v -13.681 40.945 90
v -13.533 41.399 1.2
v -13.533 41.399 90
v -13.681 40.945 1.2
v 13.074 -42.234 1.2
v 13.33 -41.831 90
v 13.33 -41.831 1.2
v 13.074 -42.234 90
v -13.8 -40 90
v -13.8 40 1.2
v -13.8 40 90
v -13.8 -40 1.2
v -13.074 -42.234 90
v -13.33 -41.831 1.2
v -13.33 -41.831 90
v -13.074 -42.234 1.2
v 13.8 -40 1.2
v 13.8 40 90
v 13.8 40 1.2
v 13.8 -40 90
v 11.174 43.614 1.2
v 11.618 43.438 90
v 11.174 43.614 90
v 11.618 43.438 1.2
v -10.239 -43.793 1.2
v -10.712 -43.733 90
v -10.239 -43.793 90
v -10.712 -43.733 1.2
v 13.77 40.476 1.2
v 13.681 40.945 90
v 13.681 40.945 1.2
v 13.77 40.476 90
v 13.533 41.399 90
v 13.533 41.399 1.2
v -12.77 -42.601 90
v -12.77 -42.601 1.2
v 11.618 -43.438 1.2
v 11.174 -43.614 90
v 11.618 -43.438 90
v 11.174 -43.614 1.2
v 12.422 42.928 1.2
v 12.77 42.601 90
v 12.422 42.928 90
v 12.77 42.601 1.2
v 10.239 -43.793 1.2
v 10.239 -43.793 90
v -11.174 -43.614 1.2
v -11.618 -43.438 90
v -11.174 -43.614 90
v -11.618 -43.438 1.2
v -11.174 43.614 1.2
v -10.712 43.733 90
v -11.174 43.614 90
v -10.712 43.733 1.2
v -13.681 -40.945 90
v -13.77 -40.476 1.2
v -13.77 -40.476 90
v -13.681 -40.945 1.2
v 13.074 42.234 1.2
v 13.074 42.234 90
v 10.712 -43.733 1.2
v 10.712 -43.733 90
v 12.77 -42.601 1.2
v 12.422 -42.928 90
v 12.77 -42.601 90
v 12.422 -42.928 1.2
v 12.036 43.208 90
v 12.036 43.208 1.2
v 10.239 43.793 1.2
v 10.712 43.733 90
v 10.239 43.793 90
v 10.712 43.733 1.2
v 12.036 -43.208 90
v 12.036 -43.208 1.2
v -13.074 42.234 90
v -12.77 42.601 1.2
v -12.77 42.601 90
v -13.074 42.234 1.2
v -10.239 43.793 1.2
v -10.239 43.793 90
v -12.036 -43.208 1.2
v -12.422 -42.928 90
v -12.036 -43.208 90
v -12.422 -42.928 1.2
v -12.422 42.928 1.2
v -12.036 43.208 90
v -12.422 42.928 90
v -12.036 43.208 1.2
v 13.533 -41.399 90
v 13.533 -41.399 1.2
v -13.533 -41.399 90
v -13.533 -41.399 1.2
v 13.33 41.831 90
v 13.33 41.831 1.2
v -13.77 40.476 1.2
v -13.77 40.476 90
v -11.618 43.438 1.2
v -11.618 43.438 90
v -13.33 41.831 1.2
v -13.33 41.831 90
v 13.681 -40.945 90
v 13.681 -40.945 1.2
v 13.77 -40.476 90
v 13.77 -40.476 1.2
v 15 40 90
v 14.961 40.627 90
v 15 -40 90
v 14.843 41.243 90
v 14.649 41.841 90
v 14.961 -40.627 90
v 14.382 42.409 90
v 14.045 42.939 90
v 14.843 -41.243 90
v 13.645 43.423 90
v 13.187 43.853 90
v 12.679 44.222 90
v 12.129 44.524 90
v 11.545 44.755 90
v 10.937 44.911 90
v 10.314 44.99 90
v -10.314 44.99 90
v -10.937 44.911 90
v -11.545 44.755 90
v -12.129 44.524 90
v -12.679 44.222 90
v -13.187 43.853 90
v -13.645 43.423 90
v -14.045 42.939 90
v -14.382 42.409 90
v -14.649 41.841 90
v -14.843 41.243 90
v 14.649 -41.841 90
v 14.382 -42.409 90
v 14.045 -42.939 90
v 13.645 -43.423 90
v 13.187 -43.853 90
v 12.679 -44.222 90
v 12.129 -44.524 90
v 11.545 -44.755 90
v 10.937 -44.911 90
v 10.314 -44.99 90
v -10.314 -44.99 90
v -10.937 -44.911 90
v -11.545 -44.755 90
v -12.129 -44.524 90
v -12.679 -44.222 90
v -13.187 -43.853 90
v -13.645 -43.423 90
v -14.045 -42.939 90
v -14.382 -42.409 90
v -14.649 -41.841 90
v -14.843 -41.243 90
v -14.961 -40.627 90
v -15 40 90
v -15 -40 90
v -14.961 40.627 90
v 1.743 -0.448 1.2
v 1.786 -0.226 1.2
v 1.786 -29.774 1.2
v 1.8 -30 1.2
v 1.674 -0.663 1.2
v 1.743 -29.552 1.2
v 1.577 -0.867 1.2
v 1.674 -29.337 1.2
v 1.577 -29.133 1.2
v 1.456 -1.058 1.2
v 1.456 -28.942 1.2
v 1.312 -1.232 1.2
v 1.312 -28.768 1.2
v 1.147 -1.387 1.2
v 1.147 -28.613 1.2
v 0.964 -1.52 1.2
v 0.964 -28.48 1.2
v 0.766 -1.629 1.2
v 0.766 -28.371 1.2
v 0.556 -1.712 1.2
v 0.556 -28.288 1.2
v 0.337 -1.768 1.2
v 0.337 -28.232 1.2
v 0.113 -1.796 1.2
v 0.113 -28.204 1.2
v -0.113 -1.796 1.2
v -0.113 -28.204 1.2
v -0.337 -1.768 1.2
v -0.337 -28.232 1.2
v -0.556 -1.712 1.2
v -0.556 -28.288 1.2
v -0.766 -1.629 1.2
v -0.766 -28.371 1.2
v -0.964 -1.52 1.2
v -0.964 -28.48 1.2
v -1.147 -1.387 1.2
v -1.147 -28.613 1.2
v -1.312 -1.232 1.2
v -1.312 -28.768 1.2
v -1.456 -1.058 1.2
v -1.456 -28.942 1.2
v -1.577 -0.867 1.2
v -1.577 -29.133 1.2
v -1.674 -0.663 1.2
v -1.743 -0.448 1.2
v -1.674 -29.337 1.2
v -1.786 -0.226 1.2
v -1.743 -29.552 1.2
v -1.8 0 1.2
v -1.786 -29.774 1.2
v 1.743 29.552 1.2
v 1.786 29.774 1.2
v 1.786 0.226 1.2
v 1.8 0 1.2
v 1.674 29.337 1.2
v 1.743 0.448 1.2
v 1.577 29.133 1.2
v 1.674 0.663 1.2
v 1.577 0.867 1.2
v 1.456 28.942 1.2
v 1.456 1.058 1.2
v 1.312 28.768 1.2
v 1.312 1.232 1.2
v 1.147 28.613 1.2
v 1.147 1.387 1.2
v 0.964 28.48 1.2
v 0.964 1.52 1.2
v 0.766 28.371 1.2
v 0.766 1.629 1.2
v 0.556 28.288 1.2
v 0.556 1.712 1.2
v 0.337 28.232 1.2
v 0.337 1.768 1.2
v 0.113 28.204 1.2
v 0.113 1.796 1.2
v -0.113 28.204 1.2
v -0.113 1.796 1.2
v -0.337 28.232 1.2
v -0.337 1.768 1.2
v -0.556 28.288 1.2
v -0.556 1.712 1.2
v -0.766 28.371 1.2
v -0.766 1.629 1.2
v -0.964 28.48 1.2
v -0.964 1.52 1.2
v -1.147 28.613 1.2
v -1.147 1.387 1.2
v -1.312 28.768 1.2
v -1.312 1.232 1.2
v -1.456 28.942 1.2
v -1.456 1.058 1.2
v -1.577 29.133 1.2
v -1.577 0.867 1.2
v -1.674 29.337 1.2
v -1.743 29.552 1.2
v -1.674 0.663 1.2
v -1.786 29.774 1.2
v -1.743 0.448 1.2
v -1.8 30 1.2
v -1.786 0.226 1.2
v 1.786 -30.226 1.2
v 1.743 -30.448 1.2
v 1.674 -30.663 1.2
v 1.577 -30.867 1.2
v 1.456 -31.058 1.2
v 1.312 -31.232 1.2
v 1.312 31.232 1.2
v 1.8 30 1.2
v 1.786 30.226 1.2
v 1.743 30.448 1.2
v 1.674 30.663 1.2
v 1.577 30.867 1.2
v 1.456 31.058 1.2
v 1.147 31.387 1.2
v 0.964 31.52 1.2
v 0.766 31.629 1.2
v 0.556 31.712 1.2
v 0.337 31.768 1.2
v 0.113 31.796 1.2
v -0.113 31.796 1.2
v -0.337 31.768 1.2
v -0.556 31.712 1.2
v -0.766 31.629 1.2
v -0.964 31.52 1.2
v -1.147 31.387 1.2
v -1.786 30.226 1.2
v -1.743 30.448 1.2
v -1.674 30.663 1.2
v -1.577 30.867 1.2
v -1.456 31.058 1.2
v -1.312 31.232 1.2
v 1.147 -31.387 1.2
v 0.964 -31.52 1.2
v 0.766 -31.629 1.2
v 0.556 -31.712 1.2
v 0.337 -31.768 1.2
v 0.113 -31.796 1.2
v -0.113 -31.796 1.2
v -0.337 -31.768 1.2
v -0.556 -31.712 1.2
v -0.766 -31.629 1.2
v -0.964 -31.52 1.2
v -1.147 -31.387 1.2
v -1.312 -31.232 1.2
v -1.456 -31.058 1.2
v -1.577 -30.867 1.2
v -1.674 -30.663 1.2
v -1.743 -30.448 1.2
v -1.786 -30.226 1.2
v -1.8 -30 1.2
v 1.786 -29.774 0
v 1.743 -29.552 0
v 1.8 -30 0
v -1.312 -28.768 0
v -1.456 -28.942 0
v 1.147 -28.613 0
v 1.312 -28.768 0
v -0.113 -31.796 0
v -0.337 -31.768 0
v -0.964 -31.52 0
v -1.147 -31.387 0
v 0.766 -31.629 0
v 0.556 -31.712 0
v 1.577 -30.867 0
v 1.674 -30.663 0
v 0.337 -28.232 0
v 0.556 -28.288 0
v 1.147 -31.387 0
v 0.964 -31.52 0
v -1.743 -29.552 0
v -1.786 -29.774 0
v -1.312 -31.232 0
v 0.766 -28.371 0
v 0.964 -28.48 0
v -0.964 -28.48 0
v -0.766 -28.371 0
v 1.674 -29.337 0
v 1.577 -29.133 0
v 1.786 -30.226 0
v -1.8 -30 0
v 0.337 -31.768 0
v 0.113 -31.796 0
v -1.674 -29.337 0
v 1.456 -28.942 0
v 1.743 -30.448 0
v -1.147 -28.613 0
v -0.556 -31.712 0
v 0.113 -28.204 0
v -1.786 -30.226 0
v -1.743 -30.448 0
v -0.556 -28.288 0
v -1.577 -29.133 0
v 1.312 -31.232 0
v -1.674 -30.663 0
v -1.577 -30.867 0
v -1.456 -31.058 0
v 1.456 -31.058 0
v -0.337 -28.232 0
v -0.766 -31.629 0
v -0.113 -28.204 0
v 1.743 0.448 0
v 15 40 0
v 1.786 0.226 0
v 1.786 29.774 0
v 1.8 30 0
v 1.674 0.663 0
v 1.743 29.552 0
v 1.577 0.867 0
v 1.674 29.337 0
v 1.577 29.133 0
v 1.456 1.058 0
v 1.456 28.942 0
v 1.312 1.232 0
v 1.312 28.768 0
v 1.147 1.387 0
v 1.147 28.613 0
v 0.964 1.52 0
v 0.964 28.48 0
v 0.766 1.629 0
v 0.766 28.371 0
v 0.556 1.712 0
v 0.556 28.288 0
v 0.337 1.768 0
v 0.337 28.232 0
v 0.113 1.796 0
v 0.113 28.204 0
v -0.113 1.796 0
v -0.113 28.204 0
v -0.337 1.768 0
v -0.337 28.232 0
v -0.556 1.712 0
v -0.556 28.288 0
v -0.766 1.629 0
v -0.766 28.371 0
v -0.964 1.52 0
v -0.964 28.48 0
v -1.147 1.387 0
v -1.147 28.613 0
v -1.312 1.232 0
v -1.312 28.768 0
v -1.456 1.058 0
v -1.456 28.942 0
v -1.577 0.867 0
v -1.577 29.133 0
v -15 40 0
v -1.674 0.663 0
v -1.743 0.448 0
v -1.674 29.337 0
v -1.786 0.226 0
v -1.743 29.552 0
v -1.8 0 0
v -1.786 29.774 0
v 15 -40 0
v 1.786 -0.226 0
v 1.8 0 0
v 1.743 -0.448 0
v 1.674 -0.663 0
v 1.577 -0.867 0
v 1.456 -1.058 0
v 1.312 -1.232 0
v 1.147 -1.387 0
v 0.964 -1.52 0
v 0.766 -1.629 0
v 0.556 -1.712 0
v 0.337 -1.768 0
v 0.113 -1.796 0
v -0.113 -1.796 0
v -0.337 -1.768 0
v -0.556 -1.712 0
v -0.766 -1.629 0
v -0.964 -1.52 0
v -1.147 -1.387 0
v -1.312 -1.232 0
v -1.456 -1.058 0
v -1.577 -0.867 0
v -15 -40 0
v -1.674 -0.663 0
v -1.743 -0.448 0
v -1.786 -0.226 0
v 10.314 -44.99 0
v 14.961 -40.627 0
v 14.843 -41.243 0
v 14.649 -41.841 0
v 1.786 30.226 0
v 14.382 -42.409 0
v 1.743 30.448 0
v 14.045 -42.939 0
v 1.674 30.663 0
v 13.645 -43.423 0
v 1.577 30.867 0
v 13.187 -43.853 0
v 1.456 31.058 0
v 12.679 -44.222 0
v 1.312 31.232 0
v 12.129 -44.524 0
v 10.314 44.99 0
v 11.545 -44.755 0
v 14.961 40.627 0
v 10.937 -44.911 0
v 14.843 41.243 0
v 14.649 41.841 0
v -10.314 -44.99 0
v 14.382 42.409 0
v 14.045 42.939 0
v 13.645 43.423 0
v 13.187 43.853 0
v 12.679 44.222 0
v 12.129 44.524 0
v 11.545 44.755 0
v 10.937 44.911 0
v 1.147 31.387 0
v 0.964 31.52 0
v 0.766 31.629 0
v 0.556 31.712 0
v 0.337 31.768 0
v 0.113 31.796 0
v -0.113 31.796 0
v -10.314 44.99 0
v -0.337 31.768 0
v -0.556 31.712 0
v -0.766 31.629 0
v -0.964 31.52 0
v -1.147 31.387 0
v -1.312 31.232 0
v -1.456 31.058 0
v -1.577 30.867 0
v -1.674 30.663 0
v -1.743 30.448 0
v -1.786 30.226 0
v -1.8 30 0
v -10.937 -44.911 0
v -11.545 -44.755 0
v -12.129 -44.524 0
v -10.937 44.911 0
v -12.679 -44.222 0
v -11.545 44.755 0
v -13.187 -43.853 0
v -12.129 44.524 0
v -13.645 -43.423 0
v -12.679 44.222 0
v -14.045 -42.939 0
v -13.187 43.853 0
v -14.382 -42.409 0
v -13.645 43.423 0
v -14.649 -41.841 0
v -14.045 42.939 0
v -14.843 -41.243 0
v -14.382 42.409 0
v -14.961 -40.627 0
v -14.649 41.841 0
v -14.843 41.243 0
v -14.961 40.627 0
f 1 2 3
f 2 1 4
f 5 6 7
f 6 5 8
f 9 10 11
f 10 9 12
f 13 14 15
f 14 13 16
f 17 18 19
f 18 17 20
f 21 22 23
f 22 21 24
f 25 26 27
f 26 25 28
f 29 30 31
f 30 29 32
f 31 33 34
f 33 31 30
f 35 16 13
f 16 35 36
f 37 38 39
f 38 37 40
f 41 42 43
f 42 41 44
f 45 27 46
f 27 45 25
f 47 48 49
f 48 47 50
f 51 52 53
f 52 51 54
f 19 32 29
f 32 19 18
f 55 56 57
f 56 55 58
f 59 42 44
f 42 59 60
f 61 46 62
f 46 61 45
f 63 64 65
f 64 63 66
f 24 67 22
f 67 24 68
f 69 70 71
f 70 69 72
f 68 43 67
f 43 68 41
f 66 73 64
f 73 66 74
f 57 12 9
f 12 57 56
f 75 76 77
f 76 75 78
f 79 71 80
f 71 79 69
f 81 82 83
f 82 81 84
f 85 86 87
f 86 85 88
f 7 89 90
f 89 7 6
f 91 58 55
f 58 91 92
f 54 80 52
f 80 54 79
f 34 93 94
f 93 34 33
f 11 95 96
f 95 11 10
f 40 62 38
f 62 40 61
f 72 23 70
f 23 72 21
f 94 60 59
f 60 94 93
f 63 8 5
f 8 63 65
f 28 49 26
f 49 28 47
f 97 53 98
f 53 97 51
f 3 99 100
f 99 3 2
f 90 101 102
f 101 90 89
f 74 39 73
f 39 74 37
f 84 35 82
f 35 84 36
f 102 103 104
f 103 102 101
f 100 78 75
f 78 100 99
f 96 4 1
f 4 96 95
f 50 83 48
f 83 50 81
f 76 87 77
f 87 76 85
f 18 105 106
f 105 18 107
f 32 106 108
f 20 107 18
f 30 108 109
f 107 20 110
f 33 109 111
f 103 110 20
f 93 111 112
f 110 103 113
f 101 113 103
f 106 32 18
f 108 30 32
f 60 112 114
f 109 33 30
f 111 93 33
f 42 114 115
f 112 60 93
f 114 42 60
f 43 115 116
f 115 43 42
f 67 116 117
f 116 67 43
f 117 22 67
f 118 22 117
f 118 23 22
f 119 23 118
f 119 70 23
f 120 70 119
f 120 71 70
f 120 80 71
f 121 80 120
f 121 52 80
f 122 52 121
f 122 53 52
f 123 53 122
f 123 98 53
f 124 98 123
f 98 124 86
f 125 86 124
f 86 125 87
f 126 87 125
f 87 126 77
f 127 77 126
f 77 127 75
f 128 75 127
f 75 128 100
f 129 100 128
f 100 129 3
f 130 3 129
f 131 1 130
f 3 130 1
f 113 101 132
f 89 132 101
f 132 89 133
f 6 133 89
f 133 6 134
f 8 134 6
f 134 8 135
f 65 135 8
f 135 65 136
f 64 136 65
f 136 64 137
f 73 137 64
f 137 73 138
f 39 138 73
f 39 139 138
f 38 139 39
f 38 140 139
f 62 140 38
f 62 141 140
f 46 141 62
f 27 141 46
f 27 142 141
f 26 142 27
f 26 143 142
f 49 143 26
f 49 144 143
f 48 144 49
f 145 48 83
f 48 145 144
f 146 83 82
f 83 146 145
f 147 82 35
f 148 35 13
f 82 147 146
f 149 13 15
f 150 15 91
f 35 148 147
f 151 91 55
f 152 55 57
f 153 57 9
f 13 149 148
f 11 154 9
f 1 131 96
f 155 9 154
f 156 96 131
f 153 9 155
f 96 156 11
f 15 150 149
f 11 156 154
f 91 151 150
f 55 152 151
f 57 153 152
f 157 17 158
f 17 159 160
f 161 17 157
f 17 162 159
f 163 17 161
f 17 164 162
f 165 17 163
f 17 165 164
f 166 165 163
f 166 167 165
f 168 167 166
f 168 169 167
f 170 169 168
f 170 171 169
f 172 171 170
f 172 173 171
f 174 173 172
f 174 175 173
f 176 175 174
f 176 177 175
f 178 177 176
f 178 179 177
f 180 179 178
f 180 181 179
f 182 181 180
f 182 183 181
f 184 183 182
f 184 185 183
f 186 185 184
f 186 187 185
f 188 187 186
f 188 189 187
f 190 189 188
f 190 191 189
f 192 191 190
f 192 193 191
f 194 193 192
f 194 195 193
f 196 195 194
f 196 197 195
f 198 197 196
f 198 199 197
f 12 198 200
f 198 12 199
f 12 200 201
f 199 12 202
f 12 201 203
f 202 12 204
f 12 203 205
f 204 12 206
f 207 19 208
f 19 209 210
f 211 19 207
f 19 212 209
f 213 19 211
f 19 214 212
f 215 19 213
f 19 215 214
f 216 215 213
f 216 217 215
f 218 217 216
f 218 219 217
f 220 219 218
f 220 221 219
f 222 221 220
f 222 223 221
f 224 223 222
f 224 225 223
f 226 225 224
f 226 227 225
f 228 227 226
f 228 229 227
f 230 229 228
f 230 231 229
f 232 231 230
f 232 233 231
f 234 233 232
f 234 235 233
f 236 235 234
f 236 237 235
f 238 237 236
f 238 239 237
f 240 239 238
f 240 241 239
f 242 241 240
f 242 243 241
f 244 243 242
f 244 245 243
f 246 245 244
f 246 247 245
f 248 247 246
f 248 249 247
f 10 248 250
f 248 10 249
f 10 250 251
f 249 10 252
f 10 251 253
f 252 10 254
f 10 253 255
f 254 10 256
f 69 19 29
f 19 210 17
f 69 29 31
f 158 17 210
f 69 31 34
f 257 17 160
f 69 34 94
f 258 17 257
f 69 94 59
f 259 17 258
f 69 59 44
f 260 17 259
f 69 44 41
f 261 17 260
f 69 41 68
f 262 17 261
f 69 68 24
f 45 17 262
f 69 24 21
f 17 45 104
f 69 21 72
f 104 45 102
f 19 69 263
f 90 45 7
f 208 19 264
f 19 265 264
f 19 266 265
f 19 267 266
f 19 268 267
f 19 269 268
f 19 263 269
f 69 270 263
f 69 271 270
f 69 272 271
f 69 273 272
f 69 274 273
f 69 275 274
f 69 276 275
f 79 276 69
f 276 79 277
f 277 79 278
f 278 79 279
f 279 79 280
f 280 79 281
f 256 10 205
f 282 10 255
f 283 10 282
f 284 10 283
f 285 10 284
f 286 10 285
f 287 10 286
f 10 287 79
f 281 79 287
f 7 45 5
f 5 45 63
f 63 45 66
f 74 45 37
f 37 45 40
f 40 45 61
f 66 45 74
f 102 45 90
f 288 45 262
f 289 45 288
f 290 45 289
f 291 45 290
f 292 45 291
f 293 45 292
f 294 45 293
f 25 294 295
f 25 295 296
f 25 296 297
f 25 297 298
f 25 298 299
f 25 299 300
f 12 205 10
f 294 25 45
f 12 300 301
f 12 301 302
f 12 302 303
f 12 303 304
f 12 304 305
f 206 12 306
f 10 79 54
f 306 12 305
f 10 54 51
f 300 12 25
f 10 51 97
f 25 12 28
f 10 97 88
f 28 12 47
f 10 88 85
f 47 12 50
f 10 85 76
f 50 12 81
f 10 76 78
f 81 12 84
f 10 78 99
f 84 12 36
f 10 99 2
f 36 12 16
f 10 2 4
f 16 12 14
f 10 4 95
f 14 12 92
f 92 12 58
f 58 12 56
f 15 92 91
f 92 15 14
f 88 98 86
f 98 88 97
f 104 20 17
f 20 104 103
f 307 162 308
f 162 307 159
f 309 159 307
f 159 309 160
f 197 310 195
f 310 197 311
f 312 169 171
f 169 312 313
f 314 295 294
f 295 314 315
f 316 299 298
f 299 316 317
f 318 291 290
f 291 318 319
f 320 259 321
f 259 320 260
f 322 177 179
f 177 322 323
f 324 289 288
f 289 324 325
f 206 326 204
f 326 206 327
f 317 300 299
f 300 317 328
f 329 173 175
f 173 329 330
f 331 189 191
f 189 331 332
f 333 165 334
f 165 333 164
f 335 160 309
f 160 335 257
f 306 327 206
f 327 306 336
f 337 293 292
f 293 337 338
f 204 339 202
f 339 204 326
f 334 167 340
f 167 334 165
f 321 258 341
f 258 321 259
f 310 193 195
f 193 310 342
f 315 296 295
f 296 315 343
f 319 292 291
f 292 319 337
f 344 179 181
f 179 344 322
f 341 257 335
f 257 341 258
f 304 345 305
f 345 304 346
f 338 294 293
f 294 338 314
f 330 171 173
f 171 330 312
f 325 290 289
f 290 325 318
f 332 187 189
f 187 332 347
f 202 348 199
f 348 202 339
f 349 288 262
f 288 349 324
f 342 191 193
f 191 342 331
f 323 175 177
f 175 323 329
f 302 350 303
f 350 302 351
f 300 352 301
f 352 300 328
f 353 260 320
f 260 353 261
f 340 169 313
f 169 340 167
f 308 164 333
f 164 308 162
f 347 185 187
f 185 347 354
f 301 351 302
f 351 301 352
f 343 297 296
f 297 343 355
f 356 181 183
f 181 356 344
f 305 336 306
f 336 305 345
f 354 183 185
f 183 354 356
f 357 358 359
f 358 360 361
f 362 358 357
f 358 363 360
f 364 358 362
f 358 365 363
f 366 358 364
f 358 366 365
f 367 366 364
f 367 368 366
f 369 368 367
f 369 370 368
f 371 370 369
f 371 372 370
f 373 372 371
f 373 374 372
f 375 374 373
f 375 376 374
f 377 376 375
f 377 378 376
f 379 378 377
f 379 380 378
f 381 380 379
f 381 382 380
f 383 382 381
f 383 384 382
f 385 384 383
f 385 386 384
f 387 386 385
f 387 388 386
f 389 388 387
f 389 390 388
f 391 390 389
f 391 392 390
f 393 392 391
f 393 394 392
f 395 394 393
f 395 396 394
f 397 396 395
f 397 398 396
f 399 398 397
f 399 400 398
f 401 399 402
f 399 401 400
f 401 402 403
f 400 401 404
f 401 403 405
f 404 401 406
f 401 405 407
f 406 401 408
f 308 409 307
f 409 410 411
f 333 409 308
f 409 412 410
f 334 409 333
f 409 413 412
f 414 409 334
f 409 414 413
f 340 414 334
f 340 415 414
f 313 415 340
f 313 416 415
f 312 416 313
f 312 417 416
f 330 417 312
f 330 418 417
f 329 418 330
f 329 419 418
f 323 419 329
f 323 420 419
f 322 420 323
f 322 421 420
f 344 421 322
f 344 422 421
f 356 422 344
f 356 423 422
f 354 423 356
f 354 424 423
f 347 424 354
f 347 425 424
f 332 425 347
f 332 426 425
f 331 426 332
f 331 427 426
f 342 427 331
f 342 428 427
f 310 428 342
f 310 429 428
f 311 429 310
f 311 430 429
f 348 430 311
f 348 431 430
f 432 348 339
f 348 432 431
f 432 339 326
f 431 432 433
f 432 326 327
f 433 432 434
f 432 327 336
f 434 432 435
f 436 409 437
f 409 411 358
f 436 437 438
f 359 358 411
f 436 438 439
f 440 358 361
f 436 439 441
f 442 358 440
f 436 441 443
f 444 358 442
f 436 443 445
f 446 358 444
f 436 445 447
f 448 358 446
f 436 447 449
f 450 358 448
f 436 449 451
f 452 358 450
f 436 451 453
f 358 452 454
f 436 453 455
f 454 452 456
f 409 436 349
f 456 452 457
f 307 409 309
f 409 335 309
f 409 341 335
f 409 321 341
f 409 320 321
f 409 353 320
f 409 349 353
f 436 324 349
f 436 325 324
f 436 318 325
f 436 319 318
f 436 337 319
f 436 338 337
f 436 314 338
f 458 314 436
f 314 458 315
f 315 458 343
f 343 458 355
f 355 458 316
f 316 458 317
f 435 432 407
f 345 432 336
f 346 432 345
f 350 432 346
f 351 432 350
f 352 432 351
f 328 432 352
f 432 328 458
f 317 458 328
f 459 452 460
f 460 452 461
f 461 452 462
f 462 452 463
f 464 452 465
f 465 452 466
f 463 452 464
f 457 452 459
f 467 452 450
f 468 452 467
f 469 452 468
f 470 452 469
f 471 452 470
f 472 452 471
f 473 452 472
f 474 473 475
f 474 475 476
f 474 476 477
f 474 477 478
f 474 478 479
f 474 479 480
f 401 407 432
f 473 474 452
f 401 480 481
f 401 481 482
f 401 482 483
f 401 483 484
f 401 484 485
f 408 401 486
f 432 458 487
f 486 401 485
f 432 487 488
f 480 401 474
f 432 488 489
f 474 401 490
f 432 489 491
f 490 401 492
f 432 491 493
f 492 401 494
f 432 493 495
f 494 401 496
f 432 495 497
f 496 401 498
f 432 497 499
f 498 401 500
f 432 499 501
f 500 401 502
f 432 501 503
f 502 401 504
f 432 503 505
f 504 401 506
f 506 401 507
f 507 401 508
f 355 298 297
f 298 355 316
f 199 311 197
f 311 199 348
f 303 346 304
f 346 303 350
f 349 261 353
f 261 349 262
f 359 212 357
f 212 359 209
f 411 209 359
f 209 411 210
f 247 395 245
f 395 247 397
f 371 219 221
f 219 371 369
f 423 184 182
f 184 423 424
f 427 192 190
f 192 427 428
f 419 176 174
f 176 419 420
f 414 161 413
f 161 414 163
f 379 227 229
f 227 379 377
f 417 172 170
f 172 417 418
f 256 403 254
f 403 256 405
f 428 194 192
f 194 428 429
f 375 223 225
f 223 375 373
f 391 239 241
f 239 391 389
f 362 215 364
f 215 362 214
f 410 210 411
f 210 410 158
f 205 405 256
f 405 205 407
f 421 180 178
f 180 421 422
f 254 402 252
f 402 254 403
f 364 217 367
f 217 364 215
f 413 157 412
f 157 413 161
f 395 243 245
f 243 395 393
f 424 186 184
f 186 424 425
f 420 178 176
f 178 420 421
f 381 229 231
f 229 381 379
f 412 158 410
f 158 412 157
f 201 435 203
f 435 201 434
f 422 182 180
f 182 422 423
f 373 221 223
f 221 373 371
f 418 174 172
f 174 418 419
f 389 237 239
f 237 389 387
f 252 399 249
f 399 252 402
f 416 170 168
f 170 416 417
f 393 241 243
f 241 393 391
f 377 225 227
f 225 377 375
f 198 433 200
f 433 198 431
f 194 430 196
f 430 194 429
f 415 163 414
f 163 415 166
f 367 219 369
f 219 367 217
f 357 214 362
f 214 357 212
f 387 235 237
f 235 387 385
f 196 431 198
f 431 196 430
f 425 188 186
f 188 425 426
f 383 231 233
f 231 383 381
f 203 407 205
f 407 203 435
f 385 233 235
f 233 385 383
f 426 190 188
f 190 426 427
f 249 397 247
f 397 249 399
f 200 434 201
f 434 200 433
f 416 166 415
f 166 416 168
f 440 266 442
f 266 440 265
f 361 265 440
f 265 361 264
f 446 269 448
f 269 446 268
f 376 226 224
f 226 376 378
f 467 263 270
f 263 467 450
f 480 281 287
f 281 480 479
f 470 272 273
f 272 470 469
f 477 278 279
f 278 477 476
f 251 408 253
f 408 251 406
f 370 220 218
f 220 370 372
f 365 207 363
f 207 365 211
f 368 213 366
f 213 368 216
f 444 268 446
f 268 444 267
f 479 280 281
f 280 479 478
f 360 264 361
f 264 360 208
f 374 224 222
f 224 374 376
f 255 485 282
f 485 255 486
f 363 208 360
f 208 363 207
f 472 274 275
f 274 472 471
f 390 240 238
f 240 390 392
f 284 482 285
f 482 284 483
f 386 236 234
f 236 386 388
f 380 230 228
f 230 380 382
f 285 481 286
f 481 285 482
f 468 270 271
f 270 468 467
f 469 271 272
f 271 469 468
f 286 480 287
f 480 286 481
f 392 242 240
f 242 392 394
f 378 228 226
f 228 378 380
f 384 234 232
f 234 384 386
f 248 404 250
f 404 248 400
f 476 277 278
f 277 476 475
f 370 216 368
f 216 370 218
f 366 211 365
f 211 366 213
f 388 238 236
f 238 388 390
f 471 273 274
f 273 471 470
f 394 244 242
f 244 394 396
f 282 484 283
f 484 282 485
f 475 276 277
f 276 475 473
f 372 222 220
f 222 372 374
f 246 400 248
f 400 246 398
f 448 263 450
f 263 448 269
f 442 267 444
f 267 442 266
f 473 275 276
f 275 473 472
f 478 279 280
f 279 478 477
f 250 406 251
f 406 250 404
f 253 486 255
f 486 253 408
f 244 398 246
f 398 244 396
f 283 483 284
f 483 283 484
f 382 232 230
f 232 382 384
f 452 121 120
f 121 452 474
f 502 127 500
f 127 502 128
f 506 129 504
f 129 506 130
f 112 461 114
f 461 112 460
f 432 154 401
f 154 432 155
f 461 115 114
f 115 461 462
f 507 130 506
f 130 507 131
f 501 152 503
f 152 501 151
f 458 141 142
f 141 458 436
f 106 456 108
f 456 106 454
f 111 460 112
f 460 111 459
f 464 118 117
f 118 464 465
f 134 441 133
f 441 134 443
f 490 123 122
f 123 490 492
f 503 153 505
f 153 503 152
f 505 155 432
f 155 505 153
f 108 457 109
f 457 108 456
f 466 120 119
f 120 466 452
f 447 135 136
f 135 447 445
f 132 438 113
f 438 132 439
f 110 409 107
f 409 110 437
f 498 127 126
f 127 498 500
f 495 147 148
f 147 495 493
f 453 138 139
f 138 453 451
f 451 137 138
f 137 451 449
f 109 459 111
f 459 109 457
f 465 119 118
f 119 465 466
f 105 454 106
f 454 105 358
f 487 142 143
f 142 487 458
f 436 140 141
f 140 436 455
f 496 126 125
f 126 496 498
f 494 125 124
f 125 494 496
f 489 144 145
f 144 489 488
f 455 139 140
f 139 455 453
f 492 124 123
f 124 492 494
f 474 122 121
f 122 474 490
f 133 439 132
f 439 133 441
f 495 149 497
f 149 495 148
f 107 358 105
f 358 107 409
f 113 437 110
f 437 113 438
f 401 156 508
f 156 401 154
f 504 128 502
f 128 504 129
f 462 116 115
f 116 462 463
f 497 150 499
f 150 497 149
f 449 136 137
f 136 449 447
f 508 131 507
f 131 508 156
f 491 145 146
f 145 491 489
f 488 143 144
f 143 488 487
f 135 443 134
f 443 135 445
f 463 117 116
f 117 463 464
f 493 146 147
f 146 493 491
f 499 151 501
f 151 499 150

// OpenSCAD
$fn = 50;


difference() {
	union() {
		hull() {
			translate(v = [-10.0000000000, 40.0000000000, 0]) {
				cylinder(h = 90, r = 5);
			}
			translate(v = [10.0000000000, 40.0000000000, 0]) {
				cylinder(h = 90, r = 5);
			}
			translate(v = [-10.0000000000, -40.0000000000, 0]) {
				cylinder(h = 90, r = 5);
			}
			translate(v = [10.0000000000, -40.0000000000, 0]) {
				cylinder(h = 90, r = 5);
			}
		}
	}
	union() {
		translate(v = [0, 0, 1.2000000000]) {
			hull() {
				translate(v = [-10.0000000000, 40.0000000000, 0]) {
					cylinder(h = 88.8000000000, r = 3.8000000000);
				}
				translate(v = [10.0000000000, 40.0000000000, 0]) {
					cylinder(h = 88.8000000000, r = 3.8000000000);
				}
				translate(v = [-10.0000000000, -40.0000000000, 0]) {
					cylinder(h = 88.8000000000, r = 3.8000000000);
				}
				translate(v = [10.0000000000, -40.0000000000, 0]) {
					cylinder(h = 88.8000000000, r = 3.8000000000);
				}
			}
		}
		#translate(v = [0.0000000000, -30.0000000000, 0]) {
			cylinder(h = 1.2000000000, r = 1.8000000000);
		}
		#cylinder(h = 1.2000000000, r = 1.8000000000);
		#translate(v = [0.0000000000, 30.0000000000, 0]) {
			cylinder(h = 1.2000000000, r = 1.8000000000);
		}
	}
}
